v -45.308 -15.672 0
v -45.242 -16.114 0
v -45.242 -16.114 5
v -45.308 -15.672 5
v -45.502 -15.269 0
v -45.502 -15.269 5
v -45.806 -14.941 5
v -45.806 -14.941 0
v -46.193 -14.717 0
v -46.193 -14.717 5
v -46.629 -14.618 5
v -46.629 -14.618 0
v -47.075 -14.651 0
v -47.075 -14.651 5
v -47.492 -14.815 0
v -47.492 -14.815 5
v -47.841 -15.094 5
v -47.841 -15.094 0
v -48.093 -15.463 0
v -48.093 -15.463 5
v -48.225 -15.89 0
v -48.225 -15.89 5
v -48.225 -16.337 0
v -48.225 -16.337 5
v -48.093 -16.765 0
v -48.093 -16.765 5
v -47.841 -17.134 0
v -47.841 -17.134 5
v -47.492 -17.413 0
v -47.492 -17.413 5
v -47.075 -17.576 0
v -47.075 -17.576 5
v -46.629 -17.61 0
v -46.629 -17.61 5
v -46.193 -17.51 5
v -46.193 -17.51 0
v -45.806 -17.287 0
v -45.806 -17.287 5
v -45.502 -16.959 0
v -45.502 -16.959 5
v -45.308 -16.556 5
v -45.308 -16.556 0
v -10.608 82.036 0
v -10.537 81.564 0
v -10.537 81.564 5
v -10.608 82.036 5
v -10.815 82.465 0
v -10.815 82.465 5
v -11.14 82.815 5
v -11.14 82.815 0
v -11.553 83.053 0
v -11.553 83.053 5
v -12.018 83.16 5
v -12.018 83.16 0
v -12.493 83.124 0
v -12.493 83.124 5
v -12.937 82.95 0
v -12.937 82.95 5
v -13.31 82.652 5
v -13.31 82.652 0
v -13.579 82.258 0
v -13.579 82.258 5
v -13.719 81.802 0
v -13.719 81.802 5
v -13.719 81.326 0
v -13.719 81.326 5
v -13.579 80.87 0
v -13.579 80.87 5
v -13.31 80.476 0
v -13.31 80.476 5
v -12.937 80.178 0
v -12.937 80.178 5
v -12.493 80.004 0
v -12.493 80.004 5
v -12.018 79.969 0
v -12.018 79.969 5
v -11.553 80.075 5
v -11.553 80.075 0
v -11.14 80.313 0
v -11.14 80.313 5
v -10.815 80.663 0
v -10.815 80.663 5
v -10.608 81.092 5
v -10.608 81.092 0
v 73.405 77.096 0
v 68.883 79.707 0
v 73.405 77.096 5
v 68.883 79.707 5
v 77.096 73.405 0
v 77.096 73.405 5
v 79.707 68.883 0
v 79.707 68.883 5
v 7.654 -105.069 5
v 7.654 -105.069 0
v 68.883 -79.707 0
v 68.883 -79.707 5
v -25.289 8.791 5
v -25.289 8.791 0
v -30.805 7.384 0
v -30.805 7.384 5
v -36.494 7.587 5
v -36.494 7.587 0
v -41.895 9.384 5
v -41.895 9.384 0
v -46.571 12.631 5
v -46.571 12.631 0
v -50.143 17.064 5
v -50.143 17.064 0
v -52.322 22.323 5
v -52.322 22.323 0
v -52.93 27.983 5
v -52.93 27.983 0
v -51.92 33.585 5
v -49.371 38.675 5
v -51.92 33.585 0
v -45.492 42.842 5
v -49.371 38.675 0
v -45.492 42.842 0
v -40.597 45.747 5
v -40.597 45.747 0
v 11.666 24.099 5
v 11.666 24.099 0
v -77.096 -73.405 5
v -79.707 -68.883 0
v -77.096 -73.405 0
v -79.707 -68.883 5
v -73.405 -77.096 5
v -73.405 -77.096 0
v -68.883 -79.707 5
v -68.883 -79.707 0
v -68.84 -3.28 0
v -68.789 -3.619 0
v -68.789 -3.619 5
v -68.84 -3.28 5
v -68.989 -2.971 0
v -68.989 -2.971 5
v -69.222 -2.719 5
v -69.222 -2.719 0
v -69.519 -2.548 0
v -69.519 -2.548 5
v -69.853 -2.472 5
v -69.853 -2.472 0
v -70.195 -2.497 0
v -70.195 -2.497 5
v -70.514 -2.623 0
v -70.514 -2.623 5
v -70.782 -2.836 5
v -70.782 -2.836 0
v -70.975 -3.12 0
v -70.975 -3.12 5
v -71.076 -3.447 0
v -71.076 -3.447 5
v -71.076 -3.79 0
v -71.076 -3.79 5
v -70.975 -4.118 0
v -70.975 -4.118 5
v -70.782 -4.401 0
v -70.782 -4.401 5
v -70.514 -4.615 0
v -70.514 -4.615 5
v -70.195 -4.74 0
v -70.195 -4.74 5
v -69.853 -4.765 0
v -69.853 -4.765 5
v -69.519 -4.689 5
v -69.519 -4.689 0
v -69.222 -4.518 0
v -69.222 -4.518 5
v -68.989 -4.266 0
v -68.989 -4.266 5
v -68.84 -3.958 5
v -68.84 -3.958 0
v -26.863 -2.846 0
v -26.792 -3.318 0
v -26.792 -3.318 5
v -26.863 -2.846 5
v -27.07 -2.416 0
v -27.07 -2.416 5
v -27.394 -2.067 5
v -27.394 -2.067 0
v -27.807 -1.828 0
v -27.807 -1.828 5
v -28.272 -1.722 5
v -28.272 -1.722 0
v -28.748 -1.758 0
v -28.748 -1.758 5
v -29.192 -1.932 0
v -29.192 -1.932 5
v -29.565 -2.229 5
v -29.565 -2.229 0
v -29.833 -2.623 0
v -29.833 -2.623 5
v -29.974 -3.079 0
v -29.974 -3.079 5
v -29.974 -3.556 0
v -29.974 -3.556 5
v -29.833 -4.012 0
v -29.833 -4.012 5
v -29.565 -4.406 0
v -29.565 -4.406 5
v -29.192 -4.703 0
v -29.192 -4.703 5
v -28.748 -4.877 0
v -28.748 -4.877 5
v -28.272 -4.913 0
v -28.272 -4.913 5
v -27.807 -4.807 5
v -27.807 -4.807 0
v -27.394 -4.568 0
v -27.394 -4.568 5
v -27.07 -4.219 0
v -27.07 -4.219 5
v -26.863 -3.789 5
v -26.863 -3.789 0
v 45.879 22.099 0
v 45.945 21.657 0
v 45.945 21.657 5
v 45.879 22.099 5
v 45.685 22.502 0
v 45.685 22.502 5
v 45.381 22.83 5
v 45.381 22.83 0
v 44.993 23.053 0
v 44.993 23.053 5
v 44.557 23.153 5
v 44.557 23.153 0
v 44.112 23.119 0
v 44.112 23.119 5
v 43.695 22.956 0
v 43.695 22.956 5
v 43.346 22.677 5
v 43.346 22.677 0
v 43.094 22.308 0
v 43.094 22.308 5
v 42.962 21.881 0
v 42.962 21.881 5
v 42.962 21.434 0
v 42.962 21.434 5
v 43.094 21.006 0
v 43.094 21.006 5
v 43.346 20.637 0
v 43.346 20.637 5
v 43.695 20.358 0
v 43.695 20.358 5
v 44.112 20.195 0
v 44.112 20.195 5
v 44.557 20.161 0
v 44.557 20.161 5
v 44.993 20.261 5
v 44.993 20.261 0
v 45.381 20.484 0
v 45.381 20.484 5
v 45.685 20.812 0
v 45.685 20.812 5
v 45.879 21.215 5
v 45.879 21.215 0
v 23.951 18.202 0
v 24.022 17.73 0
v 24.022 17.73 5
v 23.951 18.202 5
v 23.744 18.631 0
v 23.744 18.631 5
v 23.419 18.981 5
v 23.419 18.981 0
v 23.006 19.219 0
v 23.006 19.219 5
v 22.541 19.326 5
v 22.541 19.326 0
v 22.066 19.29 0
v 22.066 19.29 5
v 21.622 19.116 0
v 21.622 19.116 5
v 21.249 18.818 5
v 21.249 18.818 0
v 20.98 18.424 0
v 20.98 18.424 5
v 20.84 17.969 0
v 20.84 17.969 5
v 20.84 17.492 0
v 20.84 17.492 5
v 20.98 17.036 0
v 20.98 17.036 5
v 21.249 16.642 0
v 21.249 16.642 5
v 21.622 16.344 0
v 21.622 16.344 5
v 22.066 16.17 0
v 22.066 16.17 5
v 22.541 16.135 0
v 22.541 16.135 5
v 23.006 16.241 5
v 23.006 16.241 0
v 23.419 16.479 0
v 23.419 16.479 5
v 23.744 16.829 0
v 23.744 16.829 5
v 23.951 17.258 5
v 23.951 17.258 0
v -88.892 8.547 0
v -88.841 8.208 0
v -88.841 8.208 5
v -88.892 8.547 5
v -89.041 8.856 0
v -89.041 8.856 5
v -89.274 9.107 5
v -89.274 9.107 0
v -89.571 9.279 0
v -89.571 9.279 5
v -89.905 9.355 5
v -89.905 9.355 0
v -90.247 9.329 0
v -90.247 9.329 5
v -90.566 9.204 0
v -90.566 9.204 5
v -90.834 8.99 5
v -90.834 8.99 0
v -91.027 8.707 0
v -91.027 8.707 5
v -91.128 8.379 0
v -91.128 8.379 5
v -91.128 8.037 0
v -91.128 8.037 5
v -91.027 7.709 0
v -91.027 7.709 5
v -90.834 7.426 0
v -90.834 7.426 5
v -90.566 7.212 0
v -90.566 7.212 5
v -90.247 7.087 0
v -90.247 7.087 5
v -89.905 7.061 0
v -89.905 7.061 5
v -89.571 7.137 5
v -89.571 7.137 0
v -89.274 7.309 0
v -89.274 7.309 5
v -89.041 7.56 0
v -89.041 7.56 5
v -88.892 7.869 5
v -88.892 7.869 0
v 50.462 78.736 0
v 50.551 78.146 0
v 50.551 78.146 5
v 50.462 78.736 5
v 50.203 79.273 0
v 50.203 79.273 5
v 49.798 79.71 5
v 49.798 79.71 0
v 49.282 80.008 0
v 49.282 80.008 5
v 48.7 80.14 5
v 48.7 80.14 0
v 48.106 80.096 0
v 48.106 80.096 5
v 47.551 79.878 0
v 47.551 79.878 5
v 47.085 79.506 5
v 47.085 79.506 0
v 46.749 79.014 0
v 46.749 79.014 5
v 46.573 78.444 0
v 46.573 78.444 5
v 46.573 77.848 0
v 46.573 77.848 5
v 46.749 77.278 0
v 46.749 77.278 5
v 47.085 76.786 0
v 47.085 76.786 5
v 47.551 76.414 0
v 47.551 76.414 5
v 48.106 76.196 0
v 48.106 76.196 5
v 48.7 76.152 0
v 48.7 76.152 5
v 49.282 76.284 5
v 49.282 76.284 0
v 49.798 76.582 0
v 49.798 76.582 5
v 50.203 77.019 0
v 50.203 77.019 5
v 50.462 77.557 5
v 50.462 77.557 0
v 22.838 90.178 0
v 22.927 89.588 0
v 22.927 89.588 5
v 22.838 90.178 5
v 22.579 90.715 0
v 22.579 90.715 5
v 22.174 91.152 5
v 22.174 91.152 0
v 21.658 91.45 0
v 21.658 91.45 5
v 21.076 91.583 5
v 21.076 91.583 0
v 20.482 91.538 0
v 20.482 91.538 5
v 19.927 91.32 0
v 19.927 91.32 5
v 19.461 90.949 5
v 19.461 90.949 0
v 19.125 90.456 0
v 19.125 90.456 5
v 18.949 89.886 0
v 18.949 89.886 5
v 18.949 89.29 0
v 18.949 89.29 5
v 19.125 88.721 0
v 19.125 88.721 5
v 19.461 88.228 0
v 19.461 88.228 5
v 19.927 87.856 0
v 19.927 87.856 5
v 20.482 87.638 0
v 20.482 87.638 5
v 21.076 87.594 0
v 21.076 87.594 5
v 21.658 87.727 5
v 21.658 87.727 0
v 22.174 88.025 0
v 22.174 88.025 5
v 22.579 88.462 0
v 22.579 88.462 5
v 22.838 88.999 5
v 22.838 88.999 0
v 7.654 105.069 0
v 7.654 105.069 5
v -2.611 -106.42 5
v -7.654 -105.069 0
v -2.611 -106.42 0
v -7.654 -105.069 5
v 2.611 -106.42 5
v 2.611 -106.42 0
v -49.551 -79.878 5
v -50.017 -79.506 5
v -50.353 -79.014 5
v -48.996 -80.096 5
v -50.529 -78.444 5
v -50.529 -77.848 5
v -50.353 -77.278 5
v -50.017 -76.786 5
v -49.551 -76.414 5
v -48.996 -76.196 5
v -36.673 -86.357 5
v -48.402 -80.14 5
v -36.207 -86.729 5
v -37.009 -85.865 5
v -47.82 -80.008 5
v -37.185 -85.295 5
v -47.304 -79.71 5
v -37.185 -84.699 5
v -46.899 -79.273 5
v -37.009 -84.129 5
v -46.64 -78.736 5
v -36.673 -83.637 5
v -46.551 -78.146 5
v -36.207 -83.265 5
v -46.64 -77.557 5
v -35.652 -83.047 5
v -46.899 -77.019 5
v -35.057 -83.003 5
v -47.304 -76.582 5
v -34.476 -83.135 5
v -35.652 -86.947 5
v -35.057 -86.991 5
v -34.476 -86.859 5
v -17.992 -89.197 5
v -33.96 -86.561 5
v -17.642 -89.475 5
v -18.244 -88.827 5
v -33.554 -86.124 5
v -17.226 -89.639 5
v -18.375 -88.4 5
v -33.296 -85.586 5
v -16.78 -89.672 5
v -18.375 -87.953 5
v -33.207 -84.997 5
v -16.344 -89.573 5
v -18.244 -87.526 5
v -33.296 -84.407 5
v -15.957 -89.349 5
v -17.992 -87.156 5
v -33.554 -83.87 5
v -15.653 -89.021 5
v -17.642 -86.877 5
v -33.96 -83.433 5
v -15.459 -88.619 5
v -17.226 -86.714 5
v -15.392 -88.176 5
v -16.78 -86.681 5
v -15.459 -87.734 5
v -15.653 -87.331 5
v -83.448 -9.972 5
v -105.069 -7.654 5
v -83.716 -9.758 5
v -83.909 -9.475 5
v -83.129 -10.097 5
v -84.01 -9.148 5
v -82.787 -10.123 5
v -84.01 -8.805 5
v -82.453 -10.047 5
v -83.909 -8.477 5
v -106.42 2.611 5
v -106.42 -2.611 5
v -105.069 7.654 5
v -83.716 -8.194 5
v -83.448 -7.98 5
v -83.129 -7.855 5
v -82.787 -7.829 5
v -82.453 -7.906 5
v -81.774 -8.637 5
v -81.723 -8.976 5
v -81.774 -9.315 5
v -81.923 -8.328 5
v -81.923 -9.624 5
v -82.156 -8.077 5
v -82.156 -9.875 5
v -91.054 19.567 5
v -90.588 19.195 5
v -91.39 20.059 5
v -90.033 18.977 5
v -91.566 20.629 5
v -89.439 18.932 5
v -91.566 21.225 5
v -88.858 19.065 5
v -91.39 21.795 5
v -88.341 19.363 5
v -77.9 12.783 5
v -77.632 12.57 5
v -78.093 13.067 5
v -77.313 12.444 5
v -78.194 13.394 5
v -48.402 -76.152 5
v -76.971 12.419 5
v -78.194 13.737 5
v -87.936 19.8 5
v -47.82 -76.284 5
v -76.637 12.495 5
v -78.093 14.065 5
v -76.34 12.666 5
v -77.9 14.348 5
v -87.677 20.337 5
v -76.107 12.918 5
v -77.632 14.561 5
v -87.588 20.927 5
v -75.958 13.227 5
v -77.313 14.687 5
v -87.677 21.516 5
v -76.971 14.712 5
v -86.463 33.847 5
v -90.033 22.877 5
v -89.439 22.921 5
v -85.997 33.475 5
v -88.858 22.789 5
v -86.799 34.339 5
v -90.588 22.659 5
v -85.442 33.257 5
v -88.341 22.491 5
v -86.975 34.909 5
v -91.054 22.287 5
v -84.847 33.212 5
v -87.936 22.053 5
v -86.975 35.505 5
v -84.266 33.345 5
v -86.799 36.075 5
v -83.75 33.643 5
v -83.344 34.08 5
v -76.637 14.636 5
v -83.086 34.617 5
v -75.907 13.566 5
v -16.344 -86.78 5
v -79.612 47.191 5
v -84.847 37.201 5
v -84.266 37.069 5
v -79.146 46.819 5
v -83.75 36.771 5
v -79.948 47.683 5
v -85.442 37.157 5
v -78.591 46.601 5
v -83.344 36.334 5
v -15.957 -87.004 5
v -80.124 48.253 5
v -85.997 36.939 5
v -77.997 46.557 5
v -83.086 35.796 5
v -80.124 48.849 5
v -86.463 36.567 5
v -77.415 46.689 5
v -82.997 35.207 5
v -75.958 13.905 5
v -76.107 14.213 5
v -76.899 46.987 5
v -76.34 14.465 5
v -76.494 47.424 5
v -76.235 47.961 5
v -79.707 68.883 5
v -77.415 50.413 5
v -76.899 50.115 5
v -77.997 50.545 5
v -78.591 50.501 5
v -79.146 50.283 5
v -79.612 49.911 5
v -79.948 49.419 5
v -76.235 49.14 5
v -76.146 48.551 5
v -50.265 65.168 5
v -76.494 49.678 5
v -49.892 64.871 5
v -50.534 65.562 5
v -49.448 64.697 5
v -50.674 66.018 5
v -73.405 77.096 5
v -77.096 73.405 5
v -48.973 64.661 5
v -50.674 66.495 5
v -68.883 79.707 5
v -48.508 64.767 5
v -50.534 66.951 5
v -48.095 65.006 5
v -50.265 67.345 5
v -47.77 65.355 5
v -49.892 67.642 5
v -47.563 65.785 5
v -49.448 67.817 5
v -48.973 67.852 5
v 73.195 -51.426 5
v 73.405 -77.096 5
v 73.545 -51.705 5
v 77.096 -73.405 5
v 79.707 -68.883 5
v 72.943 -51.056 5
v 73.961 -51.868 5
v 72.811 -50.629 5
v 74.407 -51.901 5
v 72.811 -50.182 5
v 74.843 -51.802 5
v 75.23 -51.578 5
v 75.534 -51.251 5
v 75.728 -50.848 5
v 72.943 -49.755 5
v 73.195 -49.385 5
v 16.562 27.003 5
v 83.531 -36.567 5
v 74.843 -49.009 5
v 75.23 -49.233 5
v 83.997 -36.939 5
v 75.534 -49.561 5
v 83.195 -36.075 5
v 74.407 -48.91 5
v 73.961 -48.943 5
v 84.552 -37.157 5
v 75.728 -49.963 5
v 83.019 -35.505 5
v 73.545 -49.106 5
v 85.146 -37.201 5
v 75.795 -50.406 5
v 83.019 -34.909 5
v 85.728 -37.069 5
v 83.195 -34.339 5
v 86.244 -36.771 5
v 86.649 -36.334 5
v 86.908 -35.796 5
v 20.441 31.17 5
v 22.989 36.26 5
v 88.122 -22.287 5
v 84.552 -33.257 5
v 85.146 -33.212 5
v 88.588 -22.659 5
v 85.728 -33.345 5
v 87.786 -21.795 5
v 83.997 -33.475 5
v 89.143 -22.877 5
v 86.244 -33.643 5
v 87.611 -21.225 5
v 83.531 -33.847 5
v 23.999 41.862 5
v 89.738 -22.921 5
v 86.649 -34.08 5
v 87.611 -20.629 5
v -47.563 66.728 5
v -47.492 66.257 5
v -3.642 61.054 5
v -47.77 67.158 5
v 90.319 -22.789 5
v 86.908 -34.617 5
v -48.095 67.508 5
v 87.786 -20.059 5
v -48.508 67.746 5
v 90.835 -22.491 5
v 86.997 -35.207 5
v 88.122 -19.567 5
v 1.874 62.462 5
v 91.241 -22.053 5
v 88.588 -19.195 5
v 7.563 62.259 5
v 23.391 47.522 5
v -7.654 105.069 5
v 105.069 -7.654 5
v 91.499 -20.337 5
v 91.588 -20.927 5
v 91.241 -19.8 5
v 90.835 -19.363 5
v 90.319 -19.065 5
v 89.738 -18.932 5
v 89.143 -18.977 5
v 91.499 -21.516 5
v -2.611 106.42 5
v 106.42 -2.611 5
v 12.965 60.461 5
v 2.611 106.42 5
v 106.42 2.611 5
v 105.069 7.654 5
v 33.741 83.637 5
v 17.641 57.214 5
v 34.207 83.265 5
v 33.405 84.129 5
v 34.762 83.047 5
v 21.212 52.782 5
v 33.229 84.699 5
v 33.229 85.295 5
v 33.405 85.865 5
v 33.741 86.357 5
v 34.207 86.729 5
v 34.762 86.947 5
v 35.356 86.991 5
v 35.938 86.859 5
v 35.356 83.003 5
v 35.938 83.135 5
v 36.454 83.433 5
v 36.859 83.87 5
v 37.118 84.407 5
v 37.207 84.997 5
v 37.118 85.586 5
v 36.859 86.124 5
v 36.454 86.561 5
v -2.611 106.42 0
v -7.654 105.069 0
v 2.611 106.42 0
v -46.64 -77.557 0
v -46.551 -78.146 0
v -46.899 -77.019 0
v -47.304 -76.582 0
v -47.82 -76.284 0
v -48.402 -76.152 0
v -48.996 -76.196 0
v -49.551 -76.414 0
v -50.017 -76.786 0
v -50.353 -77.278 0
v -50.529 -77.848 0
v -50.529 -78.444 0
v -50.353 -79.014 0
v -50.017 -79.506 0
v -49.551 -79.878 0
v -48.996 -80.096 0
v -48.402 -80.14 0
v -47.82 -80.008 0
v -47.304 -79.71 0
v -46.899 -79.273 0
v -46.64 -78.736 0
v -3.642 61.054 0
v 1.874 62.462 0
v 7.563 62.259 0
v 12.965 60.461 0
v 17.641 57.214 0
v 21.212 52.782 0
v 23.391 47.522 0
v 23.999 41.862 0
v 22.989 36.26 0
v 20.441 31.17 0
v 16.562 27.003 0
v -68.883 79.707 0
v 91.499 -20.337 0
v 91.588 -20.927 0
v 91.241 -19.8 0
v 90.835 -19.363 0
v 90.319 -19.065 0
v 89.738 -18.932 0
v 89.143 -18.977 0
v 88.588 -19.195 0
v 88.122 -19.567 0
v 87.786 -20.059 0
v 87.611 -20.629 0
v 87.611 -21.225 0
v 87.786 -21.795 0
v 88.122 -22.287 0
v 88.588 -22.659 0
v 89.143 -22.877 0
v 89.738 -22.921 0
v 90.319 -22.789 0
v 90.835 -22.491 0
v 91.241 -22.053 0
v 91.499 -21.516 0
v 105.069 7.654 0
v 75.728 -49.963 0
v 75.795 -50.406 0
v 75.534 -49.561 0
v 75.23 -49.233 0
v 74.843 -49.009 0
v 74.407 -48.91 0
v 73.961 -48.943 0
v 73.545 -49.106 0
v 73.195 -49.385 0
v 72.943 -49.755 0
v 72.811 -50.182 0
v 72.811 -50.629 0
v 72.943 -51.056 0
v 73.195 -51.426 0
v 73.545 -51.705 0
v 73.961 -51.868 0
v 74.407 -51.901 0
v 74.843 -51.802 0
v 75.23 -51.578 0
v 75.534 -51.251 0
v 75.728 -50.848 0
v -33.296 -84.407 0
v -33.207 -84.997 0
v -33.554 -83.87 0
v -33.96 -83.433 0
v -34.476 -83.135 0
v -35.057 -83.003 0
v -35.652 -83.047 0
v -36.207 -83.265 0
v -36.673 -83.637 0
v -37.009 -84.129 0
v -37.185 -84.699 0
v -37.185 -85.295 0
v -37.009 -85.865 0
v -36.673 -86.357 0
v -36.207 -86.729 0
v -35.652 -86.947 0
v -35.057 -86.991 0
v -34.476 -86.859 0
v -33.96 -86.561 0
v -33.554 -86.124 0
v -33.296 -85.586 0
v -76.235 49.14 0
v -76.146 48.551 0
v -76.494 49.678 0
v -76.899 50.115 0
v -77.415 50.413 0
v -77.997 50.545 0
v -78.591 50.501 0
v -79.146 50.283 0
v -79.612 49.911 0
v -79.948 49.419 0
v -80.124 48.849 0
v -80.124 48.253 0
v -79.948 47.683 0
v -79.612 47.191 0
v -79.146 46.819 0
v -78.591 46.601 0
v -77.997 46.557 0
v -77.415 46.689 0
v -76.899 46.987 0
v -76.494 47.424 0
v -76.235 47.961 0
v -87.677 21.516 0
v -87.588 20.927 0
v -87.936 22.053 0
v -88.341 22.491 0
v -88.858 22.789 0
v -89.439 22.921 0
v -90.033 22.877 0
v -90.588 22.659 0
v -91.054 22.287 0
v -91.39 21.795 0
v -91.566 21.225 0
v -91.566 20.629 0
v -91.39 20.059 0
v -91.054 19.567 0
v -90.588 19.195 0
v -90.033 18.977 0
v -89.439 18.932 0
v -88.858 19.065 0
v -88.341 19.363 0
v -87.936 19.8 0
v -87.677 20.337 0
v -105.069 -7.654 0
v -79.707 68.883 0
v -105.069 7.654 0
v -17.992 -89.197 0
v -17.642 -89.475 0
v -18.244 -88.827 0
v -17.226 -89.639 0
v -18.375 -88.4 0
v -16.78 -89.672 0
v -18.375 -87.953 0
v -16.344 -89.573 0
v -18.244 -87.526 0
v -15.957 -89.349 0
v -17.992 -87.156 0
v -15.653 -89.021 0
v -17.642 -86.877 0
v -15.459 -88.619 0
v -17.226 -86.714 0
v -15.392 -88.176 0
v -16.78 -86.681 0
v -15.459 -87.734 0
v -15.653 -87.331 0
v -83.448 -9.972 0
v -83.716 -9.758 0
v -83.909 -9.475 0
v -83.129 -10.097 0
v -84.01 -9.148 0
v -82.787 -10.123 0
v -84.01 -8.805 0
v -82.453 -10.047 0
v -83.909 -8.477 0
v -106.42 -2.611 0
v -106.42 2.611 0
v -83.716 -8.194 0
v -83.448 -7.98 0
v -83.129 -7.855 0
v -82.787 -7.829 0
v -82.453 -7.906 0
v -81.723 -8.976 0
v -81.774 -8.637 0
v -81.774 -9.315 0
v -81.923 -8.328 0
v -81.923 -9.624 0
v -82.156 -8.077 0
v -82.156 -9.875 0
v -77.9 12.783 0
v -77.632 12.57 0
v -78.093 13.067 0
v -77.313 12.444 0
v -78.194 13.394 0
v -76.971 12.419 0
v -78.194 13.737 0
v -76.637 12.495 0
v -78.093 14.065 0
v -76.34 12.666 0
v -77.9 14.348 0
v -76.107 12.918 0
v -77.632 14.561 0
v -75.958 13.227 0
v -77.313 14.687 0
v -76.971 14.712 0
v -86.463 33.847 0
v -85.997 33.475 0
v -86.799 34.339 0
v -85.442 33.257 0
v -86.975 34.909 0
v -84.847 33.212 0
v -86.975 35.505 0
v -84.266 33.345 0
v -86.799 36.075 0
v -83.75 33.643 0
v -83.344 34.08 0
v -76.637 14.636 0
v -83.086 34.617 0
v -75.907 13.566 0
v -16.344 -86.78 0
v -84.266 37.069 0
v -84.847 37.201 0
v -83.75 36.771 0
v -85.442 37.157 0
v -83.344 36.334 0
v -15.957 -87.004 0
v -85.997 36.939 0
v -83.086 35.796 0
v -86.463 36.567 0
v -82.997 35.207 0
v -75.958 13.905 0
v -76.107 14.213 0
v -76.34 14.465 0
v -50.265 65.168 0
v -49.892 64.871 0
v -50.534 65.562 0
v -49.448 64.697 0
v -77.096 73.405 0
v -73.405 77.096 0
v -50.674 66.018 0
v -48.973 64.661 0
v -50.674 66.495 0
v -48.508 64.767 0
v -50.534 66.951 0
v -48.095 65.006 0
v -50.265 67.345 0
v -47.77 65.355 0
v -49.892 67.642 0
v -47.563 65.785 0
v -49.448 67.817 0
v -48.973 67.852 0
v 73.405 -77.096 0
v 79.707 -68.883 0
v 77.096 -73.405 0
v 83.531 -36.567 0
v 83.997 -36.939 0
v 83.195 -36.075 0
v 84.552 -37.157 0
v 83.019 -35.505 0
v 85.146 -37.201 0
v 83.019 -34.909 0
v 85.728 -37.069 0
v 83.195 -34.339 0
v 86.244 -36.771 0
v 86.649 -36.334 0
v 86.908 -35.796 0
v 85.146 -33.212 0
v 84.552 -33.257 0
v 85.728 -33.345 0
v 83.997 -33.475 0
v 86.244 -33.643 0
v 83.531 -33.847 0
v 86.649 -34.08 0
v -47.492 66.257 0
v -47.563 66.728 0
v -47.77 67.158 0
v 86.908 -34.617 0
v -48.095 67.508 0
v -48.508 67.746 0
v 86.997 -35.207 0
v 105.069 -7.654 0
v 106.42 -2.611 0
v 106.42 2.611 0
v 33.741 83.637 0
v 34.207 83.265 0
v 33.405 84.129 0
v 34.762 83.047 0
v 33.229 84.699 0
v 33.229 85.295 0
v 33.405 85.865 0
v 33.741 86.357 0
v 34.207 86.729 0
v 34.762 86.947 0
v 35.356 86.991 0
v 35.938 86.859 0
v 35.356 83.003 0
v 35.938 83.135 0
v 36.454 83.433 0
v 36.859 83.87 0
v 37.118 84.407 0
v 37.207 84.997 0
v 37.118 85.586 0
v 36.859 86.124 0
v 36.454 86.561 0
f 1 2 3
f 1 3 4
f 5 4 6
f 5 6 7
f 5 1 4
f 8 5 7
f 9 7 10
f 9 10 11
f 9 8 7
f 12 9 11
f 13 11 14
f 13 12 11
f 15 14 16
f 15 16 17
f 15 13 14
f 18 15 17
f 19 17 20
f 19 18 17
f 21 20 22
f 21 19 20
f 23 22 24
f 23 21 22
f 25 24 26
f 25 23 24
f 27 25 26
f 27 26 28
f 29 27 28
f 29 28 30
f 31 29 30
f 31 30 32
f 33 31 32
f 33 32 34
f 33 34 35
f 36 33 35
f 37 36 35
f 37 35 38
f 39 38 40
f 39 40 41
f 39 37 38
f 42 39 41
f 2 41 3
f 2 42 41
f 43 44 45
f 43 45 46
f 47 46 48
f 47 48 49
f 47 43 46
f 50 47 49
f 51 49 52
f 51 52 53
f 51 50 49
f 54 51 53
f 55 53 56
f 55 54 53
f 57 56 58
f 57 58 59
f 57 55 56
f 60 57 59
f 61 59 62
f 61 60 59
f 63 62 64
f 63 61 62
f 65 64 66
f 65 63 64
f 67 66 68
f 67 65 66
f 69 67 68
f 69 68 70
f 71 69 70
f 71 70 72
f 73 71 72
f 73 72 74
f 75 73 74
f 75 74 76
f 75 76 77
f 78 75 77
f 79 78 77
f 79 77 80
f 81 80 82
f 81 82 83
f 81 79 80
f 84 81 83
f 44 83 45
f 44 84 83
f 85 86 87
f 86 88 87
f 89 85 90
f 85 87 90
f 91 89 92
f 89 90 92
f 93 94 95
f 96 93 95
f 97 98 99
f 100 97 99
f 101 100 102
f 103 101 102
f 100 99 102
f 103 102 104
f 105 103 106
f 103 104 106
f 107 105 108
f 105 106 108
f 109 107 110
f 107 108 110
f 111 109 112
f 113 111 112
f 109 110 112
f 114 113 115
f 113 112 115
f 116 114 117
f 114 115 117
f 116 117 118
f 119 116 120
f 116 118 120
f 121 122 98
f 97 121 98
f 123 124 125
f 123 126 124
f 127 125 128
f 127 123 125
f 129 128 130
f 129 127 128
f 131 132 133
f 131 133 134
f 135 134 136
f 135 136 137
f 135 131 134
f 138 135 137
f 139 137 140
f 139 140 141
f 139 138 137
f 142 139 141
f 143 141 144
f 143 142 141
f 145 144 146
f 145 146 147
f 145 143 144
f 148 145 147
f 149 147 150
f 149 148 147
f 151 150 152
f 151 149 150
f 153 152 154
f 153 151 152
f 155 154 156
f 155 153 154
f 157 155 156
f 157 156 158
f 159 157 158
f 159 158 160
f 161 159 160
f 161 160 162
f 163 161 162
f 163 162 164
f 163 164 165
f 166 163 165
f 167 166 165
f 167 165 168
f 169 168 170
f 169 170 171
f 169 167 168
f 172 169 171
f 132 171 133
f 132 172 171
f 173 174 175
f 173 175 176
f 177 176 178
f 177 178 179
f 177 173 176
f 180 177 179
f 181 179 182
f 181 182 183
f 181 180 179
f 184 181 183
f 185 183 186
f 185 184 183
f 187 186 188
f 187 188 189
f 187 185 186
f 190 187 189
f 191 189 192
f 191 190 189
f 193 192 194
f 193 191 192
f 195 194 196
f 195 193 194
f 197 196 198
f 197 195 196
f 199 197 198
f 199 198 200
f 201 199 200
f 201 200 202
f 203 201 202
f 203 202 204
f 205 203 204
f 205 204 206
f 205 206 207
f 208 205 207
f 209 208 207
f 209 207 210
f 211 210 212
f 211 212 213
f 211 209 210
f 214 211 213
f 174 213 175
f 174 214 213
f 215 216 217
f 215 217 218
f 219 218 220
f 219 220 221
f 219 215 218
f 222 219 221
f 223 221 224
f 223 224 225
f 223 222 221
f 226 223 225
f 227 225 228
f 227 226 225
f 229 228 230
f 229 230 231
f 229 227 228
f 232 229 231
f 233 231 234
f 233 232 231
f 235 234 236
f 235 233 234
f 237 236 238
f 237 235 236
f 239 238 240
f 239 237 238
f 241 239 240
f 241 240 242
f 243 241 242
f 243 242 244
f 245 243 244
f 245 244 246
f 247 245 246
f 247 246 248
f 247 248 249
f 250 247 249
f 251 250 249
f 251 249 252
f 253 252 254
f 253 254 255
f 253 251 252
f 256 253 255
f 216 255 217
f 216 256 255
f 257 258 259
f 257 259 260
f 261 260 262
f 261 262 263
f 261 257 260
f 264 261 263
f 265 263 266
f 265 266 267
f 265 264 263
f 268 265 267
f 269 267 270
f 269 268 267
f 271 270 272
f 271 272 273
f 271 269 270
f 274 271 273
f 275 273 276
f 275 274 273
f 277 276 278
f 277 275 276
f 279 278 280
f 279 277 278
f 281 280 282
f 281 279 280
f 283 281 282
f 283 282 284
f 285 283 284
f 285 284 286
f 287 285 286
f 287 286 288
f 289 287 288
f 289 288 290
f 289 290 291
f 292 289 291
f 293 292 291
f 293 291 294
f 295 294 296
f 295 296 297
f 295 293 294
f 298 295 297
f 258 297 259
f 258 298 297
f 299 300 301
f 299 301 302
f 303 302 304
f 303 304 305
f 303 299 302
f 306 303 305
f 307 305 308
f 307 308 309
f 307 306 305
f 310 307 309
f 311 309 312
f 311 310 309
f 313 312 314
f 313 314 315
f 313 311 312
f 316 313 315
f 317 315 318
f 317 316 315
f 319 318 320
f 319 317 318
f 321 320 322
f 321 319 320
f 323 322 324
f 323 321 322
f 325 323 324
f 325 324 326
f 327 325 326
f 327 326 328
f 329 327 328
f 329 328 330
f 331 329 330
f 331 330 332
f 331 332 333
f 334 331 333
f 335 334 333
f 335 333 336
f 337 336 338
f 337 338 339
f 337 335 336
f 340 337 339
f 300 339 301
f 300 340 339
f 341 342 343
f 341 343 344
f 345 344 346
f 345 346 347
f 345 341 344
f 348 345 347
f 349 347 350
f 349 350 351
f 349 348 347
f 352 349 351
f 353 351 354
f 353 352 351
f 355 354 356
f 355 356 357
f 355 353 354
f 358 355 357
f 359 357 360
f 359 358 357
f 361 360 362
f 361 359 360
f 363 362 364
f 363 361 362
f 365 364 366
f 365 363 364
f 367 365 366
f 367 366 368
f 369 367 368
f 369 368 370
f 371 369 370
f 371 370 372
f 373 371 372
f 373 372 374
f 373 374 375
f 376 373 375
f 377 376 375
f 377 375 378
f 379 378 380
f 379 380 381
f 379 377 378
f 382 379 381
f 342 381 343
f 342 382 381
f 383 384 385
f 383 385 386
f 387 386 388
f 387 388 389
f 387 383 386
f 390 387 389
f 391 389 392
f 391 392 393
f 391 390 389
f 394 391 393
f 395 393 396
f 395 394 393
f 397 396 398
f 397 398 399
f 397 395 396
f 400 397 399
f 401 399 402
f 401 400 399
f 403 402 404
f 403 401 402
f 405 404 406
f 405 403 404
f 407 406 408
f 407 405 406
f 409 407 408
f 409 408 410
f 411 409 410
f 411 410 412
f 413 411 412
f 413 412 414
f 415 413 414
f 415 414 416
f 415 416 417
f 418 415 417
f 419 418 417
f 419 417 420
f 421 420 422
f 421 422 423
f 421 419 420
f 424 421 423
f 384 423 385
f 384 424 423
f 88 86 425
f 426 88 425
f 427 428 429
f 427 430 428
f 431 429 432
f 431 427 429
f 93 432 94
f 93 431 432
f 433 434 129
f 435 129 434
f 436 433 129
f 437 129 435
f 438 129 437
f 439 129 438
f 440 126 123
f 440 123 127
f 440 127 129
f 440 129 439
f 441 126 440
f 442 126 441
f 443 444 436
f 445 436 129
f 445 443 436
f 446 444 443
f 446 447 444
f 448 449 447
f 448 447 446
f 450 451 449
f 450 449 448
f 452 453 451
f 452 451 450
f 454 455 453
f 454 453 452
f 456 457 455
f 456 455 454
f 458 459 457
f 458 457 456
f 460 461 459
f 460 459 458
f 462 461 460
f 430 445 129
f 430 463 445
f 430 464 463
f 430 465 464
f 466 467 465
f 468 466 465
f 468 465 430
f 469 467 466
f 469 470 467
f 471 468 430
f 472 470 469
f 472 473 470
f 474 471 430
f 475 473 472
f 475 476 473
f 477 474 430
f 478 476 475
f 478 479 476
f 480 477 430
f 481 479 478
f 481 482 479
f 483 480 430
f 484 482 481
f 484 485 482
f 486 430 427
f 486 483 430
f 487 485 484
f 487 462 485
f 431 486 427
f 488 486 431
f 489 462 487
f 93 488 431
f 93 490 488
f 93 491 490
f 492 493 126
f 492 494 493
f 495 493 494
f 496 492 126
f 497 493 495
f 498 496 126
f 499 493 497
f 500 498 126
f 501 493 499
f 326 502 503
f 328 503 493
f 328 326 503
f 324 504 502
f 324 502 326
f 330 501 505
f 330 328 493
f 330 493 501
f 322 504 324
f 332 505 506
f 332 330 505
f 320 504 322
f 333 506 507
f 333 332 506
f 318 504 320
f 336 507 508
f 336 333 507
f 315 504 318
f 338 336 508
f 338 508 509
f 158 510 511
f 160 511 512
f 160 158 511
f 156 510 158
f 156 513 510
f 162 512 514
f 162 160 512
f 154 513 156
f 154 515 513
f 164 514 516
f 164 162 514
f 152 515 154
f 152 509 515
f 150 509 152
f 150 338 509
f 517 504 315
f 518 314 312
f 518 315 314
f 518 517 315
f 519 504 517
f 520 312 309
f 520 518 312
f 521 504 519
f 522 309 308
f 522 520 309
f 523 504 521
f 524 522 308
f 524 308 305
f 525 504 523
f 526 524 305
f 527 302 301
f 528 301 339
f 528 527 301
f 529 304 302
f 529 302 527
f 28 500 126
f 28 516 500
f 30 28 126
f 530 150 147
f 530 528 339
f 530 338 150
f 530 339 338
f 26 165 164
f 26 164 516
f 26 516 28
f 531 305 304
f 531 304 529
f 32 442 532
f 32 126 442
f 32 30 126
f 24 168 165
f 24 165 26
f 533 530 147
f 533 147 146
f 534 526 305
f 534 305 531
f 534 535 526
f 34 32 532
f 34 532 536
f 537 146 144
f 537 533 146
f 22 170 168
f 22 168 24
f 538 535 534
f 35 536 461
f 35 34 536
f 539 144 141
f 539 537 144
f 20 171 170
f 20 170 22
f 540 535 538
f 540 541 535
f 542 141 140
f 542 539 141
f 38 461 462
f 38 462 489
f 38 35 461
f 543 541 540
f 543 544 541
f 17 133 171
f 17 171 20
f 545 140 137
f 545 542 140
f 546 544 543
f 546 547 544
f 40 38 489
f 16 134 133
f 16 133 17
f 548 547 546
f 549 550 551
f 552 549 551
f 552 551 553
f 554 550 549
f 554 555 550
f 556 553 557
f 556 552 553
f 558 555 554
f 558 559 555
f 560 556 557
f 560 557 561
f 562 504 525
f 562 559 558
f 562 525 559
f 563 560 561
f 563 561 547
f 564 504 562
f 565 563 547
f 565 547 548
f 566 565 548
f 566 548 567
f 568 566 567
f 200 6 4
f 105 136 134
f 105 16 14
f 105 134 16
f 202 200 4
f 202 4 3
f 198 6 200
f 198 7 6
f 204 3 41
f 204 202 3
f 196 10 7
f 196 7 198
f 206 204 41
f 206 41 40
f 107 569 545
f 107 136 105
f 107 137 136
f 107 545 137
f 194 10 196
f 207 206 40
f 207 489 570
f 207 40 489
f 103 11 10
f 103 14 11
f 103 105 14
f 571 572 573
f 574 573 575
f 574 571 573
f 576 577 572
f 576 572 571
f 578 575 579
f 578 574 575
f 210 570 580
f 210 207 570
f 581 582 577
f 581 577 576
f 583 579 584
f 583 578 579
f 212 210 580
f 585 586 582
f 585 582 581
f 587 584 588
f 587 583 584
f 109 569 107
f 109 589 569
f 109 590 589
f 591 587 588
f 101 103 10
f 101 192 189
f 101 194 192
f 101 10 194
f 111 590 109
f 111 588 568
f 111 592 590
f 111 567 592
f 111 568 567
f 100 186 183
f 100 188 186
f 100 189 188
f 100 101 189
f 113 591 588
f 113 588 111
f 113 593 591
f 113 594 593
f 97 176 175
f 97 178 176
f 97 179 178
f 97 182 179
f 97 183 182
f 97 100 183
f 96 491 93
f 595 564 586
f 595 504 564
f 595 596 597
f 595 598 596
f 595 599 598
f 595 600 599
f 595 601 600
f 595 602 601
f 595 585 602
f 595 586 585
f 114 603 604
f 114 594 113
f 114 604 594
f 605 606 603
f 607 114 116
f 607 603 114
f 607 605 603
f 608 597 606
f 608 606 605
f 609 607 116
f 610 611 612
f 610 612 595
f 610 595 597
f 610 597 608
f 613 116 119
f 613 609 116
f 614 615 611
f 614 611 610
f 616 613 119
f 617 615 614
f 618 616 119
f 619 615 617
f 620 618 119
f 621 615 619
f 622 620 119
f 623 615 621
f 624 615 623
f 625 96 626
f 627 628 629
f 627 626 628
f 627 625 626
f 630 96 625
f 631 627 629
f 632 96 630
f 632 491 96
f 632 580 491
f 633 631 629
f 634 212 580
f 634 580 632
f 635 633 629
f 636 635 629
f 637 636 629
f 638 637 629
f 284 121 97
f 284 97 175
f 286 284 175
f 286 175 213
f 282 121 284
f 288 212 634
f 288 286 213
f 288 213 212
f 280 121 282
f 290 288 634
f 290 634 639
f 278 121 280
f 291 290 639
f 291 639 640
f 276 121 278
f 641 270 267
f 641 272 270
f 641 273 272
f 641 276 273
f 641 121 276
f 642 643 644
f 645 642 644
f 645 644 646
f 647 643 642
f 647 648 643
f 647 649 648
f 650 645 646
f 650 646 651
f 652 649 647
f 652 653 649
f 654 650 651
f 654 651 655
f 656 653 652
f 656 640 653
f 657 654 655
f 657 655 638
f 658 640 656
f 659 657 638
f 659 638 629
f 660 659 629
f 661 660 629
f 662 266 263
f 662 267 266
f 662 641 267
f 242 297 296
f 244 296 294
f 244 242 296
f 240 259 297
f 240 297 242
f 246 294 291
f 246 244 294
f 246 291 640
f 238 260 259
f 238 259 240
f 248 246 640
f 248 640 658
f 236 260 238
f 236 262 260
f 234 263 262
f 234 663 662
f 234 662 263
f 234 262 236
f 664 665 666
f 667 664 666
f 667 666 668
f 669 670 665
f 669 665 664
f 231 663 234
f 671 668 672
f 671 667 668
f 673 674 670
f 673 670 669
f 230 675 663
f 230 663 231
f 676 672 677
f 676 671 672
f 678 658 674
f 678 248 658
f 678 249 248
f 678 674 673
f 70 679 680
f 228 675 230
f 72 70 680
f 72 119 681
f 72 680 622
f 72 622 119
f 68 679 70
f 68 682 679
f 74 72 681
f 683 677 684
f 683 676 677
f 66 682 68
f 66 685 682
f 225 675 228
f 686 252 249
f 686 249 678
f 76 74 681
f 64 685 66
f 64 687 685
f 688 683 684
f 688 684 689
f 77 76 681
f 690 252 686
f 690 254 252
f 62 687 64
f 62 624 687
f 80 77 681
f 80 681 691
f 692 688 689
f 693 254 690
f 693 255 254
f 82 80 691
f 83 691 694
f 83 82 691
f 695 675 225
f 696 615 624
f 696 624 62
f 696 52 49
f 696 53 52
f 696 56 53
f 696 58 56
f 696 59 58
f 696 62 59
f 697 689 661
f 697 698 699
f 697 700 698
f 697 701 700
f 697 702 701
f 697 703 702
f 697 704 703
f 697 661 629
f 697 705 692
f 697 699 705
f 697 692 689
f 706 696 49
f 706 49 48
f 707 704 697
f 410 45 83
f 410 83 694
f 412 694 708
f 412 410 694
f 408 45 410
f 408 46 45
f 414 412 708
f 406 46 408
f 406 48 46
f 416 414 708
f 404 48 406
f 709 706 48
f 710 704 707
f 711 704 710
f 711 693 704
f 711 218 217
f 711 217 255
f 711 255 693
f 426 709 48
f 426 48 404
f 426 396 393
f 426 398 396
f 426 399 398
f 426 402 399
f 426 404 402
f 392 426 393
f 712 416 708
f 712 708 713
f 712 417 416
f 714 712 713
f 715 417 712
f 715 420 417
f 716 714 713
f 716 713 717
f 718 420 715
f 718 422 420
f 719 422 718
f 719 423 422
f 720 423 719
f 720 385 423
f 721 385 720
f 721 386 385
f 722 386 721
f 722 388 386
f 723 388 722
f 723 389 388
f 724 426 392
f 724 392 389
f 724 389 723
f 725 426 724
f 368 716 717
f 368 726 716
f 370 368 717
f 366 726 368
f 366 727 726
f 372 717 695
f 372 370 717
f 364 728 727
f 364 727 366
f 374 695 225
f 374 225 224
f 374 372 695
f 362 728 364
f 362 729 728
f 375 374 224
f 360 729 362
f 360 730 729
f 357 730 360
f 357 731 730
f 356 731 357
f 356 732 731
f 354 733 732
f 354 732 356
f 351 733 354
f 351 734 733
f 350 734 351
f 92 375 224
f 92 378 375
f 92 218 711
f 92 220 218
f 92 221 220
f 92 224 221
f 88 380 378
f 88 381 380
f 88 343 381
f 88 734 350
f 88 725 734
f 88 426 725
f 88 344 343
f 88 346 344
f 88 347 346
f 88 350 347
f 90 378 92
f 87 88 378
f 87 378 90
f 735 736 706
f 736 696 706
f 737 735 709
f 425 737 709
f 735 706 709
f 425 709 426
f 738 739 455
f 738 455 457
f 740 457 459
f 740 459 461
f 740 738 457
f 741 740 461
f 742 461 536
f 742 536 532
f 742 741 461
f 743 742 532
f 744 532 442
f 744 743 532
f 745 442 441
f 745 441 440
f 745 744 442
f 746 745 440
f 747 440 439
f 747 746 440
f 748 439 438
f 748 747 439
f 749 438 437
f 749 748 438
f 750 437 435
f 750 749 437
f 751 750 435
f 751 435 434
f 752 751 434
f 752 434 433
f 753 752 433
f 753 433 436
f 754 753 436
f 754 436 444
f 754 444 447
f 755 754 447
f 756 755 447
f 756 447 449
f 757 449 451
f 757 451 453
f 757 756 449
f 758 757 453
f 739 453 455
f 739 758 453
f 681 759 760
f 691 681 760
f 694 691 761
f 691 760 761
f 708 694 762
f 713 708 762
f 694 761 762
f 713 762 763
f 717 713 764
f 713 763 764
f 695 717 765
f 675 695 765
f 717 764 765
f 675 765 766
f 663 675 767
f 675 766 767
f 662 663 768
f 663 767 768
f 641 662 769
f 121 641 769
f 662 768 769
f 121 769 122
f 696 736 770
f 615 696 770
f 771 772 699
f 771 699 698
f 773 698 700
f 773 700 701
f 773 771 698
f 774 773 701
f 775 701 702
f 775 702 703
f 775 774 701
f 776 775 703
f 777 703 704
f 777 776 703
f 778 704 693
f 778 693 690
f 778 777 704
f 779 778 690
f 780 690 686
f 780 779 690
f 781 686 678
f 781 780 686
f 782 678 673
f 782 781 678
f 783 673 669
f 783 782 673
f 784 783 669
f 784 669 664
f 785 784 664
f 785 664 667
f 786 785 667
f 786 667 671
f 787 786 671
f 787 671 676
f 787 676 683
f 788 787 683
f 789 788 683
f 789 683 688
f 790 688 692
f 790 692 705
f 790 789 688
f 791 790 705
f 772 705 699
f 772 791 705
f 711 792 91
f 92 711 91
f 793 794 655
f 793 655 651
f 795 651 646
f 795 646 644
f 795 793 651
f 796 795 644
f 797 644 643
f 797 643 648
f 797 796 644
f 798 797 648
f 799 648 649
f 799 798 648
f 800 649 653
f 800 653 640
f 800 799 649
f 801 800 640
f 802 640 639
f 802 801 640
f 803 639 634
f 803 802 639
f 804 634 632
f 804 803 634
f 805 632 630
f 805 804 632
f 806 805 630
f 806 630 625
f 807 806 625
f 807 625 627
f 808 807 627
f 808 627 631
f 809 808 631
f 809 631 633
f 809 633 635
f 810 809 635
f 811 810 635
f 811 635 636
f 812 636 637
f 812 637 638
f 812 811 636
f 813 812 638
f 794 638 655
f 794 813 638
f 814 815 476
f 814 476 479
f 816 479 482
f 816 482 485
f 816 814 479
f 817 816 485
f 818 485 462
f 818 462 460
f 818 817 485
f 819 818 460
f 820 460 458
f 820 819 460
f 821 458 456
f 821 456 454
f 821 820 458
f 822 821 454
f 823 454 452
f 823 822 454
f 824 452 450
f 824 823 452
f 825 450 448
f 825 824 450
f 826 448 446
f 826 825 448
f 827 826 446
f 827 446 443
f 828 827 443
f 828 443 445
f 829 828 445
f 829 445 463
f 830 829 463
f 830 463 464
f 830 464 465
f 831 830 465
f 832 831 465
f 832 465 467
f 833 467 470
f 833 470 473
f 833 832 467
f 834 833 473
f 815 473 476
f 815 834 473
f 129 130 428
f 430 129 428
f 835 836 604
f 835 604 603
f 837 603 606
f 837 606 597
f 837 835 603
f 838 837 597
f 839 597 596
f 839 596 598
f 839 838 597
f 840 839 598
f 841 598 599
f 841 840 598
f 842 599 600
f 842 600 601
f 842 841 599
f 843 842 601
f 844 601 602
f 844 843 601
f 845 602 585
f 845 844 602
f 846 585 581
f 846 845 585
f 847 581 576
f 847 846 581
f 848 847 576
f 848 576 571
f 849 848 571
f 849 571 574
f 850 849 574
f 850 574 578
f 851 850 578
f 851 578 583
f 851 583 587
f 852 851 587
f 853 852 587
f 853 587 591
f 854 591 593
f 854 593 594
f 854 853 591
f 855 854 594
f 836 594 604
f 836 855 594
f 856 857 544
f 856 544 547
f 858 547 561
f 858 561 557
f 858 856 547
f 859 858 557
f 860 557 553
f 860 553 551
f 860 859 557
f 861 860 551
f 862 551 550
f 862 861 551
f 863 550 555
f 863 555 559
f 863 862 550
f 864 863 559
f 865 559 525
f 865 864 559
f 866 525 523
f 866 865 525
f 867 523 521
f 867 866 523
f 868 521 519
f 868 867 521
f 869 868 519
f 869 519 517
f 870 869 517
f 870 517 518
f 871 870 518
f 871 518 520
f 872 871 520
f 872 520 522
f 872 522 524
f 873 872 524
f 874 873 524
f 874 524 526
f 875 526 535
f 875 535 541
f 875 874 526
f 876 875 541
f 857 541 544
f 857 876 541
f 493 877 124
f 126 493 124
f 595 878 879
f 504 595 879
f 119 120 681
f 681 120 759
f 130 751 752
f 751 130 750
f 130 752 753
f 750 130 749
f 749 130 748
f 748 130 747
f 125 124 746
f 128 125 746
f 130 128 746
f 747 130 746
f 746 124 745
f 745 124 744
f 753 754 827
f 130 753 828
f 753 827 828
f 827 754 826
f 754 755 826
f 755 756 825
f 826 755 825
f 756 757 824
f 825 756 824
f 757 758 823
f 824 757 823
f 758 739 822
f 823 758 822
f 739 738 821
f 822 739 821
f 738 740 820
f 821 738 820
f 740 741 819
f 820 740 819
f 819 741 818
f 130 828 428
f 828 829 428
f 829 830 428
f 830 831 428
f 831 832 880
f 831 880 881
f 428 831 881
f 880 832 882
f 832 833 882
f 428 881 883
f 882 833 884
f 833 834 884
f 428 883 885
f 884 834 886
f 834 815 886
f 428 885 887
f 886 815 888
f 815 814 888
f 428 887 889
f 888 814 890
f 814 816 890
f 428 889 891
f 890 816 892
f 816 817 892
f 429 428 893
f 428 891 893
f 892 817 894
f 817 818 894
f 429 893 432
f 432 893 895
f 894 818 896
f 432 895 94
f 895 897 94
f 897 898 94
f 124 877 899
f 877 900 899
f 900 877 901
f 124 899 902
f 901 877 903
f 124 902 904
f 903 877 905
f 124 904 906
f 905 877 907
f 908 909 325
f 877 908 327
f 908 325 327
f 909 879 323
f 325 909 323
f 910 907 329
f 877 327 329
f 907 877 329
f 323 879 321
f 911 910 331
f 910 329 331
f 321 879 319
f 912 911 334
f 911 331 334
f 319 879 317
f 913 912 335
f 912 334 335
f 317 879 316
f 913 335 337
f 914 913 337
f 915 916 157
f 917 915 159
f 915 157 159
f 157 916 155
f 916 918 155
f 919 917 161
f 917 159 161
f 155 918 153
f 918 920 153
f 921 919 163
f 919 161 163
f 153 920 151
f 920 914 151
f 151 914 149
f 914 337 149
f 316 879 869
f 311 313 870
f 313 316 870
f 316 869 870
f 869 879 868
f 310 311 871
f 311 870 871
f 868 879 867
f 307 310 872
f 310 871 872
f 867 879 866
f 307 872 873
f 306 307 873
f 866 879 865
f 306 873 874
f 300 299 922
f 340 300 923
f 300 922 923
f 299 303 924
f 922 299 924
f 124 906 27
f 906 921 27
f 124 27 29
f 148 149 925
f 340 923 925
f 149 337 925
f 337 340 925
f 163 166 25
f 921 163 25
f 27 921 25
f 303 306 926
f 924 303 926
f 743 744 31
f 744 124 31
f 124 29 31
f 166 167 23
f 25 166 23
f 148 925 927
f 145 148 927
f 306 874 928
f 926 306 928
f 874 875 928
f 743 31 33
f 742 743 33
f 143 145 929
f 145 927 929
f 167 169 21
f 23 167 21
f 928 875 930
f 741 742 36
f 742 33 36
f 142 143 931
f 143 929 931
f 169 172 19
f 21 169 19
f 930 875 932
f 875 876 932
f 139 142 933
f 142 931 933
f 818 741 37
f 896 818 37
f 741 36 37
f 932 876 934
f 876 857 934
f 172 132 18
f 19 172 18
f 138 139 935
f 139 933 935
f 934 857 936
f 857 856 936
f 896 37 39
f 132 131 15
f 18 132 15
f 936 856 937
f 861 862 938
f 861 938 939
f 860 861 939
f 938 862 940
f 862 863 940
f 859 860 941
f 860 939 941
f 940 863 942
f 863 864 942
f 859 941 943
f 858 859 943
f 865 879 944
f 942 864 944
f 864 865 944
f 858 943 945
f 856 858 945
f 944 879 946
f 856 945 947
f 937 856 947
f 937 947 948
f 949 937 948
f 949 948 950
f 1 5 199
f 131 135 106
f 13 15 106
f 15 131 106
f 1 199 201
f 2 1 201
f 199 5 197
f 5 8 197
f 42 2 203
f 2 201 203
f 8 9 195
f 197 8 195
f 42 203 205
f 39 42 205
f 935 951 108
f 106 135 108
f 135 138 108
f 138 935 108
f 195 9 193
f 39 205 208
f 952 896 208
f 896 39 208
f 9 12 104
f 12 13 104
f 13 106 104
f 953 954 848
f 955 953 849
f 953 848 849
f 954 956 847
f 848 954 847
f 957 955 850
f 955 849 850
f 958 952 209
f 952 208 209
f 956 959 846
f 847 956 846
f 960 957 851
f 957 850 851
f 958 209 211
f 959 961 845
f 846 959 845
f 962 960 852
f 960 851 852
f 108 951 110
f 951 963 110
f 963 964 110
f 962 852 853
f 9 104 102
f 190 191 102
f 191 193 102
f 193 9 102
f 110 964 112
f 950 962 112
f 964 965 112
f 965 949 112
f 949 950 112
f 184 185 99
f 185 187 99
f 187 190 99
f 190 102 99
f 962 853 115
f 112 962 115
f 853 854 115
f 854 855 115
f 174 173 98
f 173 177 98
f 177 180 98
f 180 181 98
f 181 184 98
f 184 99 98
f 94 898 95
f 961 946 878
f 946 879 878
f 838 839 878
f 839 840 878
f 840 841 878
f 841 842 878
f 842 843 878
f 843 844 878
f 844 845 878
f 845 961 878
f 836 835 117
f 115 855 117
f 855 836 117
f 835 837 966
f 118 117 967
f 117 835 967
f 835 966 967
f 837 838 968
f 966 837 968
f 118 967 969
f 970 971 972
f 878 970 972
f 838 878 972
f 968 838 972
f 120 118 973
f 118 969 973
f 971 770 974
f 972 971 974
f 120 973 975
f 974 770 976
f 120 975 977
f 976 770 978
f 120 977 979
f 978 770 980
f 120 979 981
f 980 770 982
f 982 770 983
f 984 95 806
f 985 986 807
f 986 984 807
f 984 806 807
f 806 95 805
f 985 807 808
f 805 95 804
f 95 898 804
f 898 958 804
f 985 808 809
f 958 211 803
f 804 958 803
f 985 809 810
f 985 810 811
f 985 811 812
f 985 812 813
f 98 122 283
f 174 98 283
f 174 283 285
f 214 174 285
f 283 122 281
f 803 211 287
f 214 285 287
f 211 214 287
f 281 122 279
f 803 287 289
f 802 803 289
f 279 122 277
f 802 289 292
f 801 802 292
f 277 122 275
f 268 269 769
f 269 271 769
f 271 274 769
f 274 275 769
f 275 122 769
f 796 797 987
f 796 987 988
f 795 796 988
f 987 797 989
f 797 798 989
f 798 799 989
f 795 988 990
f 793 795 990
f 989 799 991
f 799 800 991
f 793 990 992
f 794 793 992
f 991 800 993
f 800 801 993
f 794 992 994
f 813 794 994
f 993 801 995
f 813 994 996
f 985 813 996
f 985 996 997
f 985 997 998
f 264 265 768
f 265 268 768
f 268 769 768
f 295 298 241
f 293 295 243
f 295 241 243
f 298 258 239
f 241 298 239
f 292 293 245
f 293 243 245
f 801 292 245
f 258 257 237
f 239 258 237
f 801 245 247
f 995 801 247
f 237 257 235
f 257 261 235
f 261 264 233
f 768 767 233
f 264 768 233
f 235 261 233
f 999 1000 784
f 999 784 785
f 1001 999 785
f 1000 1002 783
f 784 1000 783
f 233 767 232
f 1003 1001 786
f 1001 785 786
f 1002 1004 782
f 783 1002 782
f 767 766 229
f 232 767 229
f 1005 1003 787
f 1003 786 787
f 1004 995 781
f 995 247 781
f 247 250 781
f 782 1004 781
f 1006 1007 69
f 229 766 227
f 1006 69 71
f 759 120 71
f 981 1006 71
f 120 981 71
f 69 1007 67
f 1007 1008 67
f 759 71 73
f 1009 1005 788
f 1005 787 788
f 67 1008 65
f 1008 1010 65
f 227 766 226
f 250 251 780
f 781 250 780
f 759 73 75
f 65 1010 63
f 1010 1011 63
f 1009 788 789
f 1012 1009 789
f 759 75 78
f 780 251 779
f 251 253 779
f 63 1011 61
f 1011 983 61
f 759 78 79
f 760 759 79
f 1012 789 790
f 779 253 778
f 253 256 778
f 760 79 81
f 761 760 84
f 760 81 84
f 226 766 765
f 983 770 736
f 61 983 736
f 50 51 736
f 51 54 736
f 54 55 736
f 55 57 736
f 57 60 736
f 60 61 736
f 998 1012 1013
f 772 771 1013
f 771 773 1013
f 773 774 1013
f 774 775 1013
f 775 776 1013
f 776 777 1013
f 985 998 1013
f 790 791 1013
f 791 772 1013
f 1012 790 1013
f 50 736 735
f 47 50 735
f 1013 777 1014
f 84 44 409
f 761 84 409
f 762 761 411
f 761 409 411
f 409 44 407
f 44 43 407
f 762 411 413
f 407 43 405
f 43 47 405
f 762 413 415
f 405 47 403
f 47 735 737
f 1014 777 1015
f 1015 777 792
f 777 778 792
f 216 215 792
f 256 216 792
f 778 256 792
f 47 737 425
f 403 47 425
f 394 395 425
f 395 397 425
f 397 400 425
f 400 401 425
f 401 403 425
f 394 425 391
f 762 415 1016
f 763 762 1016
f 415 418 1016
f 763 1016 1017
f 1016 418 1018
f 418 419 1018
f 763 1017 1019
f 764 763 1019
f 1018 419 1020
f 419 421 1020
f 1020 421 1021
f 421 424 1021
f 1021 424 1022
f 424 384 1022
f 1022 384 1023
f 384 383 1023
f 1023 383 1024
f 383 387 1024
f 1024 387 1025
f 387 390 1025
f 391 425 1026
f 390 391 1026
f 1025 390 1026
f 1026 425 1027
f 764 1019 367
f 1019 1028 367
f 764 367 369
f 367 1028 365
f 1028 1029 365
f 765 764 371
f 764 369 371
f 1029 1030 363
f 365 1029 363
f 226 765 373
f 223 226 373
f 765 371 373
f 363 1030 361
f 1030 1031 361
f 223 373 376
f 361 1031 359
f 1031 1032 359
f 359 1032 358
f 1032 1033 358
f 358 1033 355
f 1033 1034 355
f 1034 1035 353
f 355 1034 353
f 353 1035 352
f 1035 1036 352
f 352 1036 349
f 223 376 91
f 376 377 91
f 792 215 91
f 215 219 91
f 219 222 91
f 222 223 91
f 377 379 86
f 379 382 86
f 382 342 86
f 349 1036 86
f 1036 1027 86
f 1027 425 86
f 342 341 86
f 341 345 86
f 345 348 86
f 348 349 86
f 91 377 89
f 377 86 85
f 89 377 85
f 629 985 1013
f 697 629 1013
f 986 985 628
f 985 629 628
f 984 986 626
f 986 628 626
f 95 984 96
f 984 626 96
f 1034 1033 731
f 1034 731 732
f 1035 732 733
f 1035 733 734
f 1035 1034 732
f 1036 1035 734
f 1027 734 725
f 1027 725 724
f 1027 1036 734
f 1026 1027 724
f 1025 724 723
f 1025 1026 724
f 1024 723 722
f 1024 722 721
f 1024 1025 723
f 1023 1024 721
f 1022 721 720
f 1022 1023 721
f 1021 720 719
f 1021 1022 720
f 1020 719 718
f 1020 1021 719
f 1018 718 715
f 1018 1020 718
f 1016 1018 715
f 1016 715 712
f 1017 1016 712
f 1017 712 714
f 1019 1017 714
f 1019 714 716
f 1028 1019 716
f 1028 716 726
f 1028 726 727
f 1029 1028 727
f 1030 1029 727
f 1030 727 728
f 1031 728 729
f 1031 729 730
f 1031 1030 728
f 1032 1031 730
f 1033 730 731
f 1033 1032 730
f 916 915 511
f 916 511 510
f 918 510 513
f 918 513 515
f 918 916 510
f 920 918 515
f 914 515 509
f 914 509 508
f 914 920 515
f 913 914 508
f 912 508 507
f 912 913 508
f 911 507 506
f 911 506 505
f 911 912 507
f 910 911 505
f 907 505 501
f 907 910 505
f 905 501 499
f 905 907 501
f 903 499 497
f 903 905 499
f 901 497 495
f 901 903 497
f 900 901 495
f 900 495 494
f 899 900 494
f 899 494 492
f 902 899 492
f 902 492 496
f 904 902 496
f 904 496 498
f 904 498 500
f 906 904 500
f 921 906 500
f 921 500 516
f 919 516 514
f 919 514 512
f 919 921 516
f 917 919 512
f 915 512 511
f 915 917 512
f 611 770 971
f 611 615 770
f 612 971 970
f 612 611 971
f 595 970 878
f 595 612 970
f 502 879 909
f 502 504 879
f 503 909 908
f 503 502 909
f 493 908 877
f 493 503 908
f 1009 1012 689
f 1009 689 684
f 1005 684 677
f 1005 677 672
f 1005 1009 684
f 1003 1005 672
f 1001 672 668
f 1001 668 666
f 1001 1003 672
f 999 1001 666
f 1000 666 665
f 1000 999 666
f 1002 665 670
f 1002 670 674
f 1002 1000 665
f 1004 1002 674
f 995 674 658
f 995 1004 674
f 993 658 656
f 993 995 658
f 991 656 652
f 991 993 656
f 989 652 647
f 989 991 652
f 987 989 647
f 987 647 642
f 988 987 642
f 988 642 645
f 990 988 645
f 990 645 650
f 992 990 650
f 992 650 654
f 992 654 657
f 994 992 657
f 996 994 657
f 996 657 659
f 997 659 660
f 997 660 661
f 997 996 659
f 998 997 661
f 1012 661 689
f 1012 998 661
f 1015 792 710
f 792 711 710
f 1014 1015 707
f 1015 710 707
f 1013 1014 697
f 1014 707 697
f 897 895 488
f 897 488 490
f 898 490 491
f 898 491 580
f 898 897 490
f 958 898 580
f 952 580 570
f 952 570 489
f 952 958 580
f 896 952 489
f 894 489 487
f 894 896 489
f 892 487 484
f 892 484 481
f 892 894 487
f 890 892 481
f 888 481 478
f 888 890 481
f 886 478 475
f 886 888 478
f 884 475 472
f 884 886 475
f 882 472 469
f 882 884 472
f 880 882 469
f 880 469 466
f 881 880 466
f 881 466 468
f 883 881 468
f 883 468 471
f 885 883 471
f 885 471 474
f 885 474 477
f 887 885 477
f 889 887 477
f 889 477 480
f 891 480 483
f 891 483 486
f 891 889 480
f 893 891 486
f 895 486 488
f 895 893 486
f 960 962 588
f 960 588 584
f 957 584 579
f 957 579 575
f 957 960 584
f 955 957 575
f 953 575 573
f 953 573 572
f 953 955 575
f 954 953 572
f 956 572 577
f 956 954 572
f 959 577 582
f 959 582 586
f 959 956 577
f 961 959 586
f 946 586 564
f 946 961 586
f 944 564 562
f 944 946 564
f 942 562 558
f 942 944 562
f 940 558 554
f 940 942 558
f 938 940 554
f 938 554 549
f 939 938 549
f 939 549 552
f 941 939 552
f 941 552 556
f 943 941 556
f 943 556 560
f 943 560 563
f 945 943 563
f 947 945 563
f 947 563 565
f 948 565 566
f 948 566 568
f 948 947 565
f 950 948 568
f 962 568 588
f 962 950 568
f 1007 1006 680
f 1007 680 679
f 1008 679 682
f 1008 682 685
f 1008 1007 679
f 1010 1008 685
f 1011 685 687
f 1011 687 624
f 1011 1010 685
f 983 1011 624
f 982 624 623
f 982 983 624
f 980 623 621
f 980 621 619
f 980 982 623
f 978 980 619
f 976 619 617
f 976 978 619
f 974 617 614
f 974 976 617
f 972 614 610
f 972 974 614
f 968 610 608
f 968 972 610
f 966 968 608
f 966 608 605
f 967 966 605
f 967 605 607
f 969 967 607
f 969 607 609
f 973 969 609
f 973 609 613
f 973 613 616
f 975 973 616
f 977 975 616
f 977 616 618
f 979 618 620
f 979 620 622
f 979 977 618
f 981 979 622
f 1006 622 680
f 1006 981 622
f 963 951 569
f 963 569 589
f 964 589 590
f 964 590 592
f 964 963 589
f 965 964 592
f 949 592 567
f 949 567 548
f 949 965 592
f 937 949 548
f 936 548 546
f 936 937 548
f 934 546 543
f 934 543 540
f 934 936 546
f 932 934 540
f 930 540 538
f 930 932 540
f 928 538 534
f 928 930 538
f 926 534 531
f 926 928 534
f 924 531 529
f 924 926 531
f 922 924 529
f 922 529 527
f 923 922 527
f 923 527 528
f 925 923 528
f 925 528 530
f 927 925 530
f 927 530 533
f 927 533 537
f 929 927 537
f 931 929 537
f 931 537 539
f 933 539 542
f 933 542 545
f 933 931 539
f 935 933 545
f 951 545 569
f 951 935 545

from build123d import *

# Parameters (mm, degrees)
SKETCH_1_R      = 1.5
SKETCH_1_R_2    = 2
SKETCH_1_R_3    = 1.6
SKETCH_1_R_4    = 1.15
EXTRUDE_1_DEPTH = 5
FILLET_1_R      = 20


with BuildPart() as part:
    # 草图1 → 凸台-拉伸1 (new body)
    with BuildSketch(Plane.XY):
        Polygon((0, 108.239220029), (-76.536686473, 76.536686473), (-108.239220029, 0), (-76.536686473, -76.536686473), (0, -108.239220029), (76.536686473, -76.536686473), (108.239220029, 0), (76.536686473, 76.536686473), align=None)
        with Locations((-46.741505227, -16.11378879)):
            Circle(SKETCH_1_R, mode=Mode.SUBTRACT)
        with Locations((-16.892197502, -88.176392326)):
            Circle(SKETCH_1_R, mode=Mode.SUBTRACT)
        with Locations((74.294712357, -50.405537551)):
            Circle(SKETCH_1_R, mode=Mode.SUBTRACT)
        with Locations((44.445404632, 21.657065985)):
            Circle(SKETCH_1_R, mode=Mode.SUBTRACT)
        with Locations((-35.206875778, -84.996916991)):
            Circle(SKETCH_1_R_2, mode=Mode.SUBTRACT)
        with Locations((84.996916991, -35.206875778)):
            Circle(SKETCH_1_R_2, mode=Mode.SUBTRACT)
        with Locations((35.206875778, 84.996916991)):
            Circle(SKETCH_1_R_2, mode=Mode.SUBTRACT)
        with Locations((-84.996916991, 35.206875778)):
            Circle(SKETCH_1_R_2, mode=Mode.SUBTRACT)
        with Locations((22.421756372, 17.730054744)):
            Circle(SKETCH_1_R_3, mode=Mode.SUBTRACT)
        with Locations((-28.391617917, -3.317534036)):
            Circle(SKETCH_1_R_3, mode=Mode.SUBTRACT)
        with Locations((-49.092265239, 66.256693954)):
            Circle(SKETCH_1_R_3, mode=Mode.SUBTRACT)
        with Locations((-12.137083939, 81.564031248)):
            Circle(SKETCH_1_R_3, mode=Mode.SUBTRACT)
        with Locations((-89.991239438, 8.207996367)):
            Circle(SKETCH_1_R_4, mode=Mode.SUBTRACT)
        with Locations((-77.056925983, 13.56556442)):
            Circle(SKETCH_1_R_4, mode=Mode.SUBTRACT)
        with Locations((-69.939014141, -3.618594885)):
            Circle(SKETCH_1_R_4, mode=Mode.SUBTRACT)
        with Locations((-82.873327596, -8.976162938)):
            Circle(SKETCH_1_R_4, mode=Mode.SUBTRACT)
        with Locations((48.55098737, 78.146027573)):
            Circle(SKETCH_1_R_2, mode=Mode.SUBTRACT)
        with Locations((20.926853617, 89.588318422)):
            Circle(SKETCH_1_R_2, mode=Mode.SUBTRACT)
        with Locations((89.588318422, -20.926853617)):
            Circle(SKETCH_1_R_2, mode=Mode.SUBTRACT)
        with Locations((-48.55098737, -78.146027573)):
            Circle(SKETCH_1_R_2, mode=Mode.SUBTRACT)
        with Locations((-78.146027573, 48.55098737)):
            Circle(SKETCH_1_R_2, mode=Mode.SUBTRACT)
        with Locations((-89.588318422, 20.926853617)):
            Circle(SKETCH_1_R_2, mode=Mode.SUBTRACT)
        with BuildLine():
            Line((-40.596693041, 45.746568332), (-3.64151174, 61.053905626))
            ThreePointArc((-3.64151174, 61.053905626), (22.489747557, 50.229983624), (11.665825554, 24.098724326))
            Line((11.665825554, 24.098724326), (-25.289355746, 8.791387031))
            ThreePointArc((-25.289355746, 8.791387031), (-51.420615044, 19.615309034), (-40.596693041, 45.746568332))
        make_face(mode=Mode.SUBTRACT)
    extrude(amount=EXTRUDE_1_DEPTH)

    # 圆角1
    fillet_1_edges = [part.edges().sort_by_distance(p)[0] for p in [
        (76.536686473, 76.536686473, 2.5),
        (108.239220029, 0, 2.5),
        (76.536686473, -76.536686473, 2.5),
        (0, -108.239220029, 2.5),
        (-76.536686473, -76.536686473, 2.5),
        (-108.239220029, 0, 2.5),
        (-76.536686473, 76.536686473, 2.5),
        (0, 108.239220029, 2.5),
    ]]
    fillet(fillet_1_edges, radius=FILLET_1_R)


solid = part.part
